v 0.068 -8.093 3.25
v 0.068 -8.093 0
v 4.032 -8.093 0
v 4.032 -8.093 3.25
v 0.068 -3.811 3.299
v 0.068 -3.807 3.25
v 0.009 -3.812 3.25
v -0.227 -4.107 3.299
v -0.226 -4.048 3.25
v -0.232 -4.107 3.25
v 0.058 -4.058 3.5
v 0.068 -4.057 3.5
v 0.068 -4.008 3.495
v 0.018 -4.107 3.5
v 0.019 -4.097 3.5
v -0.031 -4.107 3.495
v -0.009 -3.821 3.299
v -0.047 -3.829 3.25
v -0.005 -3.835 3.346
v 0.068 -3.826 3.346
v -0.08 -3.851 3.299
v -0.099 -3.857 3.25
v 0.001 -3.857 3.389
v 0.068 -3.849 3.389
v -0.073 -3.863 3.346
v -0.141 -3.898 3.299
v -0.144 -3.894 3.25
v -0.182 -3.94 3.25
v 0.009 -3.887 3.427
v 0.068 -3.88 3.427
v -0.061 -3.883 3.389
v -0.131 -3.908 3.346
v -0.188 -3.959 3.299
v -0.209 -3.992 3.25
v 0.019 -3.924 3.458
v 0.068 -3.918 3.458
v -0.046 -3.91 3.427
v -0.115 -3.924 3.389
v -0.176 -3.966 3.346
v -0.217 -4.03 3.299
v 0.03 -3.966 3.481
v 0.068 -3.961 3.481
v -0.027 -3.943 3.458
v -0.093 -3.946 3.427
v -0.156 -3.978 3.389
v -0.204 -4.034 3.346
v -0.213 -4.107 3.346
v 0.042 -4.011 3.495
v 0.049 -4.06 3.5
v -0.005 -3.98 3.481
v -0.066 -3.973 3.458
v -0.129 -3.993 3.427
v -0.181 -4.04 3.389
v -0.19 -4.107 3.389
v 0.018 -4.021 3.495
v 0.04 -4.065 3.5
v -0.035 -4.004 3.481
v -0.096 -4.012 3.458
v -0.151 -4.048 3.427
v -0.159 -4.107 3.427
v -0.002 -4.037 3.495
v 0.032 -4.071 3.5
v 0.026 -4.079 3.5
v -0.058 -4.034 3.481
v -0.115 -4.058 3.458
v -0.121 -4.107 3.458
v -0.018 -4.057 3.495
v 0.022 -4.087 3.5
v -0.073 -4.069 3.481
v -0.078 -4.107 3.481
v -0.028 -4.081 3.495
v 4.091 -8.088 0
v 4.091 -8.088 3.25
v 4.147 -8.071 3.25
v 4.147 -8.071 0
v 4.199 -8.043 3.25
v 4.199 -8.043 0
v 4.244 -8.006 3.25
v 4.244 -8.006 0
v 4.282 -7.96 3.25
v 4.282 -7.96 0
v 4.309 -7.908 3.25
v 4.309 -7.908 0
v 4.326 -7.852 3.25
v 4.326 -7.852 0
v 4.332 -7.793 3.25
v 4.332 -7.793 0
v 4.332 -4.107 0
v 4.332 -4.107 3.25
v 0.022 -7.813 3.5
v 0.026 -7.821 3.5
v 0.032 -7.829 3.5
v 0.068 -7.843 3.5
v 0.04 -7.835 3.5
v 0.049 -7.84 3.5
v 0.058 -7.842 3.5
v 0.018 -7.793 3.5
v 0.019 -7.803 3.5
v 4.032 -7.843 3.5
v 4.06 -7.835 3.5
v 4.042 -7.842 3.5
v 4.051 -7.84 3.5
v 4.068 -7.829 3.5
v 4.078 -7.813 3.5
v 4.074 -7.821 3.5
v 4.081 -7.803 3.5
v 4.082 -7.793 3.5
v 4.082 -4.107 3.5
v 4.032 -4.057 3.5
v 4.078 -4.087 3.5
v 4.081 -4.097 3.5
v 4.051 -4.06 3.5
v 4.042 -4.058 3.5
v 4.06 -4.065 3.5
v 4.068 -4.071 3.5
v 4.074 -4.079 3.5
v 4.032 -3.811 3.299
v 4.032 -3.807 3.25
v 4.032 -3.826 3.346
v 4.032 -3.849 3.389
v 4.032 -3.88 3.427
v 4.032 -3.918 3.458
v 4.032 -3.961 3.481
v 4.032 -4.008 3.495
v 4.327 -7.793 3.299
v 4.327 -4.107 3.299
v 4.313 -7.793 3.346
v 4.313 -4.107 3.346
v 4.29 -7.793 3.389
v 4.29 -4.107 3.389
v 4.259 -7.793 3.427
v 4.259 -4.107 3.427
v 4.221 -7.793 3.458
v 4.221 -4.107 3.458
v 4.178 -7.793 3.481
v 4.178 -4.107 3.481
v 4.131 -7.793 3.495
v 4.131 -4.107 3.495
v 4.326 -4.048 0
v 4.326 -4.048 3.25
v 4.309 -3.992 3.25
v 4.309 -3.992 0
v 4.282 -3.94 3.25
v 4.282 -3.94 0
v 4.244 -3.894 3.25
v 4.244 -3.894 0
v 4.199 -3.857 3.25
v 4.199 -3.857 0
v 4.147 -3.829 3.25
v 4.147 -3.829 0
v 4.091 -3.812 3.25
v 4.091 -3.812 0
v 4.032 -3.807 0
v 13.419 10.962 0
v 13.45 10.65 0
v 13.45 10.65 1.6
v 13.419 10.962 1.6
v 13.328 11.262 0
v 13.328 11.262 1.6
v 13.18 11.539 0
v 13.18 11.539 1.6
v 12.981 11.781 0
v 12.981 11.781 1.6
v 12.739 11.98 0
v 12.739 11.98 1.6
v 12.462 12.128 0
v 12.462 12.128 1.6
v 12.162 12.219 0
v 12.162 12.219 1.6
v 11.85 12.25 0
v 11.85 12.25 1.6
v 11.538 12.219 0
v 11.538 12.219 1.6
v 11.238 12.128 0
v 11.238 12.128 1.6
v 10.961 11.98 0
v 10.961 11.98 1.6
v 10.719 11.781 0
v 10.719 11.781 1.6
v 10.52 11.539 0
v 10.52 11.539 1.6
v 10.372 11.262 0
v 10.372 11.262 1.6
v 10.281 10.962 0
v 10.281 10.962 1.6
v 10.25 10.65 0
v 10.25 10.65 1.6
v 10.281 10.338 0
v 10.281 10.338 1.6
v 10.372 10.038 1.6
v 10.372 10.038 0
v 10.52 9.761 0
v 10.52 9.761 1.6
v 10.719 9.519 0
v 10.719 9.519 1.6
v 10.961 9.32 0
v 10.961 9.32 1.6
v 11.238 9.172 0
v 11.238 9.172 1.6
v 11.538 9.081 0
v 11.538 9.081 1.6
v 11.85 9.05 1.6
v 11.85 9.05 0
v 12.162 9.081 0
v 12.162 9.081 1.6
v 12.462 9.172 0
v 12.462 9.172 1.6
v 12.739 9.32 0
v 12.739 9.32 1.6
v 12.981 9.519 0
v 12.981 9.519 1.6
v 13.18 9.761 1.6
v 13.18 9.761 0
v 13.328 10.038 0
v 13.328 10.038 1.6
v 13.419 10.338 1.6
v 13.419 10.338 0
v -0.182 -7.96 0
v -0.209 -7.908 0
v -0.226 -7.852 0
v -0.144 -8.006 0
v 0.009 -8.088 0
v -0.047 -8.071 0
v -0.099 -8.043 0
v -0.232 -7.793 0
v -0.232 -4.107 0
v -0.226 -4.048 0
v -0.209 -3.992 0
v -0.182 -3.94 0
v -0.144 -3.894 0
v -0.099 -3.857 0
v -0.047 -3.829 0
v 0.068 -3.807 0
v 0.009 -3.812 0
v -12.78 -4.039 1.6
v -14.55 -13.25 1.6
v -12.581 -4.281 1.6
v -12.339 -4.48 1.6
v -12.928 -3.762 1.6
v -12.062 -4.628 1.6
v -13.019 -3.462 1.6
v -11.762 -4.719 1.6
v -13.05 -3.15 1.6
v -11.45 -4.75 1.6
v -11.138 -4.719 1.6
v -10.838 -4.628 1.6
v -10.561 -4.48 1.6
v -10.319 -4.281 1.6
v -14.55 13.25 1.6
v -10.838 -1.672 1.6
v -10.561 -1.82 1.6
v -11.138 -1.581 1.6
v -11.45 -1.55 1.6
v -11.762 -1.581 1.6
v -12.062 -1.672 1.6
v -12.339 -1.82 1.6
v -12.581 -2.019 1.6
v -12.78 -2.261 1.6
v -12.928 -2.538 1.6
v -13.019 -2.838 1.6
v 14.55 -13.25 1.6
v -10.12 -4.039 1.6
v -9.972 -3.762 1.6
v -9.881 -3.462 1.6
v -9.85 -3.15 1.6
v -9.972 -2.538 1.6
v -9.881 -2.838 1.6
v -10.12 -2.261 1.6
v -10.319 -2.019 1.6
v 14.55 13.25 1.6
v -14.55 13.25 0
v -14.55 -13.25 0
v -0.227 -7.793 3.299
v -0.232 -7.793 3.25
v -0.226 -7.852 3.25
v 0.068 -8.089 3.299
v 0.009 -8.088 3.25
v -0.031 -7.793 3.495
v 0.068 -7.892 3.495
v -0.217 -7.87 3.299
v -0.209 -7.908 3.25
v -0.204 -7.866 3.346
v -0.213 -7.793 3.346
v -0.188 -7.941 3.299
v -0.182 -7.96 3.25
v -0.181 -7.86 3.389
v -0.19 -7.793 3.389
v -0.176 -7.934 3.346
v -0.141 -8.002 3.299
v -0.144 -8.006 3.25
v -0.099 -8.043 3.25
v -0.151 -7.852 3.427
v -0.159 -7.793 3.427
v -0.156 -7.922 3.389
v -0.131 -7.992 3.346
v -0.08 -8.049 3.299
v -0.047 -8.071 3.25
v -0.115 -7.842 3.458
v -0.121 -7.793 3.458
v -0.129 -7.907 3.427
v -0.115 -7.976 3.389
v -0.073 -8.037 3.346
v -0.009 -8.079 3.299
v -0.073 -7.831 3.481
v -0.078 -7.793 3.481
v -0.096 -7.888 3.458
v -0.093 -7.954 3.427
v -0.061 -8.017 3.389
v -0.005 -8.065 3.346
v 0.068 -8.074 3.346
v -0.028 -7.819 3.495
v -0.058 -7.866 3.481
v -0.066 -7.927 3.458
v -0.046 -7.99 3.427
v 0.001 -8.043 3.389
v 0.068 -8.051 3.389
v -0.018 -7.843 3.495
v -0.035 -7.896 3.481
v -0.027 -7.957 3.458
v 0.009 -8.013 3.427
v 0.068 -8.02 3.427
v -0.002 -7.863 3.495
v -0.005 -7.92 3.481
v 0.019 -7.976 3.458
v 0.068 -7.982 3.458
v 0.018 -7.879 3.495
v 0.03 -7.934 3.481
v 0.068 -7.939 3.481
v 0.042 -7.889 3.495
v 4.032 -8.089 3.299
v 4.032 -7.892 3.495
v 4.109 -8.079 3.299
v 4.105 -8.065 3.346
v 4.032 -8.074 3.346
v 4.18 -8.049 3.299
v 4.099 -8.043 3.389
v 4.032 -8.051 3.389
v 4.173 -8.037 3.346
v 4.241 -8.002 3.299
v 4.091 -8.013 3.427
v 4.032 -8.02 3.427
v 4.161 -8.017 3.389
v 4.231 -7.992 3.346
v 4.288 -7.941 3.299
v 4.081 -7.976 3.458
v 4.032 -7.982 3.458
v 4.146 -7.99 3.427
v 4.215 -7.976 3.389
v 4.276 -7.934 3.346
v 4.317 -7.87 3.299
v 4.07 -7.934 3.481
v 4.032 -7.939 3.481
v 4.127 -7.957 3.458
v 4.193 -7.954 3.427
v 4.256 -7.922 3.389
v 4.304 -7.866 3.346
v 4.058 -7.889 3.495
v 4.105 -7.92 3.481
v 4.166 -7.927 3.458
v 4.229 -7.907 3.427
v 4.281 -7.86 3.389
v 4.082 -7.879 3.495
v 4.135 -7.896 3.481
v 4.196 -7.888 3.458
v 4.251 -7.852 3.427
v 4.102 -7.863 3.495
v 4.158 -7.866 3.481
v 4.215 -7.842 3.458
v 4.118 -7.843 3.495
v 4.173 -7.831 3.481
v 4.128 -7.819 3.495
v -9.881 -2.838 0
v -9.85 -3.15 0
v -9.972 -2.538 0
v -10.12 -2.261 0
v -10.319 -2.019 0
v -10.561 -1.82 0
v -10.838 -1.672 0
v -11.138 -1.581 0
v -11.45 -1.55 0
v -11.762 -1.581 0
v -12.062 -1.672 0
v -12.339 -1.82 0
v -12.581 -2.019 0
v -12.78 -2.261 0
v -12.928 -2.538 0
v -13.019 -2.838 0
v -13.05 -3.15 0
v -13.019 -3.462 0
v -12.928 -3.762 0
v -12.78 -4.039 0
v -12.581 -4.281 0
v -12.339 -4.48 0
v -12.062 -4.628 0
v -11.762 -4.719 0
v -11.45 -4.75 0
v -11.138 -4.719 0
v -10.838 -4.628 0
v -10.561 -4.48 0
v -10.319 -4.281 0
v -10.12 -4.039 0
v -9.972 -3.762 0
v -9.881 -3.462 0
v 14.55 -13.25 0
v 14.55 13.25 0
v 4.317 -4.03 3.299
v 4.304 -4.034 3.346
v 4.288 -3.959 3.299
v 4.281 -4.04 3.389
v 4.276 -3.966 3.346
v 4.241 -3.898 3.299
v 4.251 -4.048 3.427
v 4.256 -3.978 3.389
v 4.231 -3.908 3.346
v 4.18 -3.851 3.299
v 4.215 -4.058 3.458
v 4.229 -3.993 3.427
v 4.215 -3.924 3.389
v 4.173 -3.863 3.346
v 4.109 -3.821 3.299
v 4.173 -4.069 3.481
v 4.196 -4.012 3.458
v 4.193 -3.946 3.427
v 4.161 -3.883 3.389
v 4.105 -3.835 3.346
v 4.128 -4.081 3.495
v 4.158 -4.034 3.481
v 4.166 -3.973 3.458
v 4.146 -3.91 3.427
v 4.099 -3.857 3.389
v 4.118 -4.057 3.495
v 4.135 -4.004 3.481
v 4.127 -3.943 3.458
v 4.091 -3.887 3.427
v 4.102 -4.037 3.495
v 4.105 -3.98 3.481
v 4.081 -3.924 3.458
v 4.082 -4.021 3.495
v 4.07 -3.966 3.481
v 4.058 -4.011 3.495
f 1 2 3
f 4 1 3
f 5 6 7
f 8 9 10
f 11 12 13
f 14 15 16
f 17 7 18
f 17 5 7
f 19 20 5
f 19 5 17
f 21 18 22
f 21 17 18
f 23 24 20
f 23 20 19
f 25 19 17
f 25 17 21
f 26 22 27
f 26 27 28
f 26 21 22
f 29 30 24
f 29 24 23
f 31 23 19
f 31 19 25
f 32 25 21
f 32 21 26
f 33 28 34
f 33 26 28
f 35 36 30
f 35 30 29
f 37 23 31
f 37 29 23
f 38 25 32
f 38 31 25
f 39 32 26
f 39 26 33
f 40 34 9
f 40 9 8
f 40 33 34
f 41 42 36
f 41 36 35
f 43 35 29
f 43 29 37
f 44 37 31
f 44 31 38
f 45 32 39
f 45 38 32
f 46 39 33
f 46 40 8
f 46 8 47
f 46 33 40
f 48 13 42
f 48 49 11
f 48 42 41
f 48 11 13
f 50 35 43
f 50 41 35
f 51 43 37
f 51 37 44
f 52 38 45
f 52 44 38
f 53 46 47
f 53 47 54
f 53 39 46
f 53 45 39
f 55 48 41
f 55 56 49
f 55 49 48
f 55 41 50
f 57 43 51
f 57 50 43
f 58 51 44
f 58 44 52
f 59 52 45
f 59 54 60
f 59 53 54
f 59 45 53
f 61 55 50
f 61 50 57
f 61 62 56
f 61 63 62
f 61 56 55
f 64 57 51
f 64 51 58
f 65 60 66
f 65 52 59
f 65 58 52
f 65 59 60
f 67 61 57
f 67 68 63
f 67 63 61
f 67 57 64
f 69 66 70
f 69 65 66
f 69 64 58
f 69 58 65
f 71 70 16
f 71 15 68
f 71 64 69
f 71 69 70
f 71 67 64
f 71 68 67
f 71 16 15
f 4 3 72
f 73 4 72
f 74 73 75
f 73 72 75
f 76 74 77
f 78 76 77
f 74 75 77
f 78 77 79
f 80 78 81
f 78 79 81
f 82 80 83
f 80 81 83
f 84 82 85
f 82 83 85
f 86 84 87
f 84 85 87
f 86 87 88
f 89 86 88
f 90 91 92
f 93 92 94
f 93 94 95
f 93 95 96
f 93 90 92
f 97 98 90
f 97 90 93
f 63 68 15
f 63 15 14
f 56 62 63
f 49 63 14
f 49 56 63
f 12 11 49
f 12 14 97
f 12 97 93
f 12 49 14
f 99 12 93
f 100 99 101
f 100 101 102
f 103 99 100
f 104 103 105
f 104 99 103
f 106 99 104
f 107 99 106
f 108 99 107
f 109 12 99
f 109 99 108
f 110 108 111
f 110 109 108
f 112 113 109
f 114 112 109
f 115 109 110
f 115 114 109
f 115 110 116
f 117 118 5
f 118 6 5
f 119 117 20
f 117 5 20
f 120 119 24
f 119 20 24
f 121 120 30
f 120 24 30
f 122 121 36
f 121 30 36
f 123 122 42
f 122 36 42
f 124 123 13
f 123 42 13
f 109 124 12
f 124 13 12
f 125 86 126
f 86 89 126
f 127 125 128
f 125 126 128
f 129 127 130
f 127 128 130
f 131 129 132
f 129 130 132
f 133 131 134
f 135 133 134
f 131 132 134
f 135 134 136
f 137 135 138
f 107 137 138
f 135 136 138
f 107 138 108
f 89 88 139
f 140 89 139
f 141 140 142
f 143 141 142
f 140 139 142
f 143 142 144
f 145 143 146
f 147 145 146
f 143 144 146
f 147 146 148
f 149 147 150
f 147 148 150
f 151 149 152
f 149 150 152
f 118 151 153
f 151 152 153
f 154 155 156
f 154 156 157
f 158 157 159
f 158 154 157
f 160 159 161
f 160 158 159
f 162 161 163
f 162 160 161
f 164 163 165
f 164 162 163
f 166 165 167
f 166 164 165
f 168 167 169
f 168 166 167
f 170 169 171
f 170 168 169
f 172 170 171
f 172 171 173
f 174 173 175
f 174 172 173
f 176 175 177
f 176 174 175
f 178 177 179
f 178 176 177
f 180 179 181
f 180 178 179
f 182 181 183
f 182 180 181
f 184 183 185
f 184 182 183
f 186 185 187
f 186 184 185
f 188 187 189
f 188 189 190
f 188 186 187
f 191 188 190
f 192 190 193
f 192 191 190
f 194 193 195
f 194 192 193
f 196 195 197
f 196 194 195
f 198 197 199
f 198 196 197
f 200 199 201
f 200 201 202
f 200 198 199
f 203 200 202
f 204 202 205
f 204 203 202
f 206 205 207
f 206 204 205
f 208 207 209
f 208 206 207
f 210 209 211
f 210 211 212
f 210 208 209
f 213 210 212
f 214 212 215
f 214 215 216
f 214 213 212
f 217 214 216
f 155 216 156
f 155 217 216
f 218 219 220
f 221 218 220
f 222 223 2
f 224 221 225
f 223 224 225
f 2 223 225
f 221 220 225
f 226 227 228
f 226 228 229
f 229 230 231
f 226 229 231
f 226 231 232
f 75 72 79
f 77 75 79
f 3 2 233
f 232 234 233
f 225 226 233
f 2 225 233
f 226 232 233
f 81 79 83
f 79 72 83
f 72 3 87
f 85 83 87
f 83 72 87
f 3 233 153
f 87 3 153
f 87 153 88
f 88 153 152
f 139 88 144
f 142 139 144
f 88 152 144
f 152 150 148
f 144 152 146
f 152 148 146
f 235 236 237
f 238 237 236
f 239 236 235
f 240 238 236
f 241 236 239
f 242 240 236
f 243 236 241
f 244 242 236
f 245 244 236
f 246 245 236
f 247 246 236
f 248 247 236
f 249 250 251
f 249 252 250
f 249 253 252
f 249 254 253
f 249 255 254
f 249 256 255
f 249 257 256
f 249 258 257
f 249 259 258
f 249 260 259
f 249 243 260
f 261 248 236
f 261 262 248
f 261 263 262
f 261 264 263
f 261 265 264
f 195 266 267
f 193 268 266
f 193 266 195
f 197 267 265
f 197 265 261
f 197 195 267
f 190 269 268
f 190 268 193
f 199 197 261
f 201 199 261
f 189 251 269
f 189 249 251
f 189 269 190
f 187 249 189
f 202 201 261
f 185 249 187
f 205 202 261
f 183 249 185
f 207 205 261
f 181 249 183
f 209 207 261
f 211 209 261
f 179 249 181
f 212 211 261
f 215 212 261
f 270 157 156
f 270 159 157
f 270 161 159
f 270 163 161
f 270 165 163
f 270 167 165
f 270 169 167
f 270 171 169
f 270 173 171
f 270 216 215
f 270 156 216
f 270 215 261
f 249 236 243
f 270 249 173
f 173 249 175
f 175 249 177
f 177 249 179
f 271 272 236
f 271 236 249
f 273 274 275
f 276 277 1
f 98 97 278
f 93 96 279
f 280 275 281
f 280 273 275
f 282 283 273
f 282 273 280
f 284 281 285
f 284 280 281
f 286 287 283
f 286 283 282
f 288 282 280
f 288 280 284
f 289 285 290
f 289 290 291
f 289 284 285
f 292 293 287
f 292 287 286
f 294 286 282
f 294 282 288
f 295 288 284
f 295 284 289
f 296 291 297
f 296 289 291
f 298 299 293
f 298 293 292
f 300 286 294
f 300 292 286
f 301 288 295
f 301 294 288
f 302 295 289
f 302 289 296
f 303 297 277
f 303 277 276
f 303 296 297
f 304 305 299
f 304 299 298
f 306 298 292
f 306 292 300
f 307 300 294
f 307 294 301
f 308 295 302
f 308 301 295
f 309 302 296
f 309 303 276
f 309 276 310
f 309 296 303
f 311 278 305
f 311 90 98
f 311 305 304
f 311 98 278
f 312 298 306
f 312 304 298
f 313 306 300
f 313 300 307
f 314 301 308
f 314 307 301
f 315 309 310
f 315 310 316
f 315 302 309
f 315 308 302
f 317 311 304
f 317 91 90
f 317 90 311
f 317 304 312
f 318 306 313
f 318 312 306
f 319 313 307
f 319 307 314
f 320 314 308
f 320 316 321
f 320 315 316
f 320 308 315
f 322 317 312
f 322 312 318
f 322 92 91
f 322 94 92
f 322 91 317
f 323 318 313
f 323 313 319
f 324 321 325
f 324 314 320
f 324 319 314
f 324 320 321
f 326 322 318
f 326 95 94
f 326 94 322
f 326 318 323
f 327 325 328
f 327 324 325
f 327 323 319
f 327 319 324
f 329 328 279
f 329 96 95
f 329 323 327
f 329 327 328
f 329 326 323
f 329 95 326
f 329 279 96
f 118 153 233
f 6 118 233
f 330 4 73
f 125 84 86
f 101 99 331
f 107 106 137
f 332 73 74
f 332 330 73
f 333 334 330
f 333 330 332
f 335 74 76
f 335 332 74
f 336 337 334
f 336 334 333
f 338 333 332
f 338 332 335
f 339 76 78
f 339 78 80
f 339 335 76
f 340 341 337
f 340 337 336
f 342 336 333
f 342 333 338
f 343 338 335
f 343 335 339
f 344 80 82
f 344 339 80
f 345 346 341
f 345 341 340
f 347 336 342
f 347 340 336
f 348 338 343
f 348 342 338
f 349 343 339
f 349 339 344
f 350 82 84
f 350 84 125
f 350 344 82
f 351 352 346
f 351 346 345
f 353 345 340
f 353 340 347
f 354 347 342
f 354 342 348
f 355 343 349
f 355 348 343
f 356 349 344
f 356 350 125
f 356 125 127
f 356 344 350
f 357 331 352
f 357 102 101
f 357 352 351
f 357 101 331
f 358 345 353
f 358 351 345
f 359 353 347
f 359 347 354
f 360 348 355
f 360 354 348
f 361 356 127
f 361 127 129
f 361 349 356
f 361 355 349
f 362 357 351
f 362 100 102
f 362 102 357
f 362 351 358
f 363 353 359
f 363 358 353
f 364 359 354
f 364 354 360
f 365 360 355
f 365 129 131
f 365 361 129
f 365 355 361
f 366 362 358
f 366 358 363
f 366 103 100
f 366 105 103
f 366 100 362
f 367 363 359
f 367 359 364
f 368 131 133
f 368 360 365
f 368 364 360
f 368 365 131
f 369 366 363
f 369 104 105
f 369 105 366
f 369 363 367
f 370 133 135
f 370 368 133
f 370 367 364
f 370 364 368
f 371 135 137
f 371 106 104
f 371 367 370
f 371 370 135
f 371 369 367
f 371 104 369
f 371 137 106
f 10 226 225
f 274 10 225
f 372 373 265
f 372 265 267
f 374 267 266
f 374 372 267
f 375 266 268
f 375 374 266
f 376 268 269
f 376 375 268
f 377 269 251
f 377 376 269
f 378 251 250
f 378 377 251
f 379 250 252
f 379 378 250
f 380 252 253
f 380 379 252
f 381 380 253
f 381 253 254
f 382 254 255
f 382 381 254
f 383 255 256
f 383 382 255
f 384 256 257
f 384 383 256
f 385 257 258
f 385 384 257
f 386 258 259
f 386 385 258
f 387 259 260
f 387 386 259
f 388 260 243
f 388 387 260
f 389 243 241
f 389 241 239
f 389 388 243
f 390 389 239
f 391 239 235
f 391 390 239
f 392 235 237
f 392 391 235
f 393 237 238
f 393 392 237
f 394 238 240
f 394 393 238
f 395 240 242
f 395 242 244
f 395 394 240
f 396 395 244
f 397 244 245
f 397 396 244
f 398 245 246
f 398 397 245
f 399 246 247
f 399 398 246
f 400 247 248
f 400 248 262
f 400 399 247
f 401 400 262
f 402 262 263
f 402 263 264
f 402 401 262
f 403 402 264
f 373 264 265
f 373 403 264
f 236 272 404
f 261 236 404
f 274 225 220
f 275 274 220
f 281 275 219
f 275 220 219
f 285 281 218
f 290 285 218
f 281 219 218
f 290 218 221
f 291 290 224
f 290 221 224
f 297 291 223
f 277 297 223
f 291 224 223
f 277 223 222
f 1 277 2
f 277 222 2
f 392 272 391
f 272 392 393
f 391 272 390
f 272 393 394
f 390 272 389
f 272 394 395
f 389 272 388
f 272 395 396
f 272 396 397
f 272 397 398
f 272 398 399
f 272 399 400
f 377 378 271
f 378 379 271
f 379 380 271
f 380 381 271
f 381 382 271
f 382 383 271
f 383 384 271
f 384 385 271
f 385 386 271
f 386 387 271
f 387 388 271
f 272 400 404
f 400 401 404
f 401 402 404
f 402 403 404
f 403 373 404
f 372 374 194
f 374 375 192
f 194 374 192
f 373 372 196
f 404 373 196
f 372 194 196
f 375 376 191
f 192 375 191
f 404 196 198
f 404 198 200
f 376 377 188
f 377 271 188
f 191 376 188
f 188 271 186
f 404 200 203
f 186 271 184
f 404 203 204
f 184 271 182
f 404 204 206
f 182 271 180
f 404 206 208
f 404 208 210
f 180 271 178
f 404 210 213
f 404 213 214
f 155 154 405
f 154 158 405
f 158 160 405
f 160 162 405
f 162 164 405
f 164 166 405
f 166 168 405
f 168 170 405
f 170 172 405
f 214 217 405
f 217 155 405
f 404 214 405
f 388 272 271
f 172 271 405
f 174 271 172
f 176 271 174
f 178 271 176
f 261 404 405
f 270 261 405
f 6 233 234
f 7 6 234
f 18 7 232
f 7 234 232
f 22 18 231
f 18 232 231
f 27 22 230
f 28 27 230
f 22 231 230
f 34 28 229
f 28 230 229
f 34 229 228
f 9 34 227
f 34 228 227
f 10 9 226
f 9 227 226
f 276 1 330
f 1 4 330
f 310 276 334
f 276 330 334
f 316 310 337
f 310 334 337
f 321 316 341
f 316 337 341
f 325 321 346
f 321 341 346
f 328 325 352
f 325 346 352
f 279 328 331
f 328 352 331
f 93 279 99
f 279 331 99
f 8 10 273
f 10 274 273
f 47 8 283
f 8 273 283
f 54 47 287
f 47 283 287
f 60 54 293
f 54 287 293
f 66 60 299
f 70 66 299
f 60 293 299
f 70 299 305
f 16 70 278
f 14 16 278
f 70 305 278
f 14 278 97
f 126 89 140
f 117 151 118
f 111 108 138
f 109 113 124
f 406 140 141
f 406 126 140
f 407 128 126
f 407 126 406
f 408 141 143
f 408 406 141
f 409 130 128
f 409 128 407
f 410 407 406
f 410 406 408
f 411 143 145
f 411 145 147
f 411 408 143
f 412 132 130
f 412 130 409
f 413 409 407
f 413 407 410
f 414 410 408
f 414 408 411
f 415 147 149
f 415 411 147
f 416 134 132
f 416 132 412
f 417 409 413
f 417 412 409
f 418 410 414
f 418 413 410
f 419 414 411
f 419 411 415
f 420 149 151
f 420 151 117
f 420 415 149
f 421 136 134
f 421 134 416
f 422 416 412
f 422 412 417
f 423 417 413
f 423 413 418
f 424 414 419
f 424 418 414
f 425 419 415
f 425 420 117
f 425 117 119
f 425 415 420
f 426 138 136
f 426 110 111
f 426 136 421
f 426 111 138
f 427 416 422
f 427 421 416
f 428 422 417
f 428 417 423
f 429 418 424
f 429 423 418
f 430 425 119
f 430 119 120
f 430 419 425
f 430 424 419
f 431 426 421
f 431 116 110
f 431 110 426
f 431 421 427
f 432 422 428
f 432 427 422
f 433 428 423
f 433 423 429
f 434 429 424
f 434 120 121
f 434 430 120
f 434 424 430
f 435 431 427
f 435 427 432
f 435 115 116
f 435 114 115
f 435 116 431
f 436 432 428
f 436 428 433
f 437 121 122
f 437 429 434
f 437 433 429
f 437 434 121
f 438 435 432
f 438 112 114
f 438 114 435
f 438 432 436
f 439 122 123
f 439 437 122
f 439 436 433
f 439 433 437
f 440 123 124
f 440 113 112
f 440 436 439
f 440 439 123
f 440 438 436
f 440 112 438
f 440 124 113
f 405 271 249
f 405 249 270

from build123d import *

# Parameters (mm, degrees)
F0_W     = 29.1
F0_H     = 26.5
F0_R     = 1.6
F1_DEPTH = 1.6
F2_DEPTH = 3.5
F3_R     = 0.25


with BuildPart() as f1:
    # F0 (on Top) → F1 (new body)
    with BuildSketch(Plane.XY):
        Rectangle(F0_W, F0_H)
        with Locations((-11.45, -3.15)):
            Circle(F0_R, mode=Mode.SUBTRACT)
        with BuildLine():
            ThreePointArc((4.3321857128, -7.7934560769), (4.2443177472, -8.0055881112), (4.0321857128, -8.0934560769))
            Line((4.0321857128, -8.0934560769), (0.0678142872, -8.0934560769))
            ThreePointArc((0.0678142872, -8.0934560769), (-0.1443177472, -8.0055881112), (-0.2321857128, -7.7934560769))
            Line((-0.2321857128, -7.7934560769), (-0.2321857128, -4.1065439231))
            ThreePointArc((-0.2321857128, -4.1065439231), (-0.1443177472, -3.8944118888), (0.0678142872, -3.8065439231))
            Line((0.0678142872, -3.8065439231), (4.0321857128, -3.8065439231))
            ThreePointArc((4.0321857128, -3.8065439231), (4.2443177472, -3.8944118888), (4.3321857128, -4.1065439231))
            Line((4.3321857128, -4.1065439231), (4.3321857128, -7.7934560769))
        make_face(mode=Mode.SUBTRACT)
        with Locations((11.85, 10.65)):
            Circle(F0_R, mode=Mode.SUBTRACT)
        with BuildLine():
            Line((0.0678142872, -8.0934560769), (4.0321857128, -8.0934560769))
            ThreePointArc((4.0321857128, -8.0934560769), (4.2443177472, -8.0055881112), (4.3321857128, -7.7934560769))
            Line((4.3321857128, -7.7934560769), (4.3321857128, -4.1065439231))
            ThreePointArc((4.3321857128, -4.1065439231), (4.2443177472, -3.8944118888), (4.0321857128, -3.8065439231))
            Line((4.0321857128, -3.8065439231), (0.0678142872, -3.8065439231))
            ThreePointArc((0.0678142872, -3.8065439231), (-0.1443177472, -3.8944118888), (-0.2321857128, -4.1065439231))
            Line((-0.2321857128, -4.1065439231), (-0.2321857128, -7.7934560769))
            ThreePointArc((-0.2321857128, -7.7934560769), (-0.1443177472, -8.0055881112), (0.0678142872, -8.0934560769))
        make_face()
    extrude(amount=F1_DEPTH)


with BuildPart() as f2:
    # F0 (on Top) → F2 (new body)
    with BuildSketch(Plane.XY):
        with BuildLine():
            Line((0.0678142872, -8.0934560769), (4.0321857128, -8.0934560769))
            ThreePointArc((4.0321857128, -8.0934560769), (4.2443177472, -8.0055881112), (4.3321857128, -7.7934560769))
            Line((4.3321857128, -7.7934560769), (4.3321857128, -4.1065439231))
            ThreePointArc((4.3321857128, -4.1065439231), (4.2443177472, -3.8944118888), (4.0321857128, -3.8065439231))
            Line((4.0321857128, -3.8065439231), (0.0678142872, -3.8065439231))
            ThreePointArc((0.0678142872, -3.8065439231), (-0.1443177472, -3.8944118888), (-0.2321857128, -4.1065439231))
            Line((-0.2321857128, -4.1065439231), (-0.2321857128, -7.7934560769))
            ThreePointArc((-0.2321857128, -7.7934560769), (-0.1443177472, -8.0055881112), (0.0678142872, -8.0934560769))
        make_face()
    extrude(amount=F2_DEPTH)

    # F3
    f3_edges = [f2.edges().sort_by_distance(p)[0] for p in [
        (-0.144318, -8.005588, 3.5),
        (2.05, -8.093456, 3.5),
        (4.244318, -8.005588, 3.5),
        (4.332186, -5.95, 3.5),
        (4.244318, -3.894412, 3.5),
        (2.05, -3.806544, 3.5),
        (-0.144318, -3.894412, 3.5),
        (-0.232186, -5.95, 3.5),
    ]]
    fillet(f3_edges, radius=F3_R)


solid = Compound([f1.part, f2.part])
